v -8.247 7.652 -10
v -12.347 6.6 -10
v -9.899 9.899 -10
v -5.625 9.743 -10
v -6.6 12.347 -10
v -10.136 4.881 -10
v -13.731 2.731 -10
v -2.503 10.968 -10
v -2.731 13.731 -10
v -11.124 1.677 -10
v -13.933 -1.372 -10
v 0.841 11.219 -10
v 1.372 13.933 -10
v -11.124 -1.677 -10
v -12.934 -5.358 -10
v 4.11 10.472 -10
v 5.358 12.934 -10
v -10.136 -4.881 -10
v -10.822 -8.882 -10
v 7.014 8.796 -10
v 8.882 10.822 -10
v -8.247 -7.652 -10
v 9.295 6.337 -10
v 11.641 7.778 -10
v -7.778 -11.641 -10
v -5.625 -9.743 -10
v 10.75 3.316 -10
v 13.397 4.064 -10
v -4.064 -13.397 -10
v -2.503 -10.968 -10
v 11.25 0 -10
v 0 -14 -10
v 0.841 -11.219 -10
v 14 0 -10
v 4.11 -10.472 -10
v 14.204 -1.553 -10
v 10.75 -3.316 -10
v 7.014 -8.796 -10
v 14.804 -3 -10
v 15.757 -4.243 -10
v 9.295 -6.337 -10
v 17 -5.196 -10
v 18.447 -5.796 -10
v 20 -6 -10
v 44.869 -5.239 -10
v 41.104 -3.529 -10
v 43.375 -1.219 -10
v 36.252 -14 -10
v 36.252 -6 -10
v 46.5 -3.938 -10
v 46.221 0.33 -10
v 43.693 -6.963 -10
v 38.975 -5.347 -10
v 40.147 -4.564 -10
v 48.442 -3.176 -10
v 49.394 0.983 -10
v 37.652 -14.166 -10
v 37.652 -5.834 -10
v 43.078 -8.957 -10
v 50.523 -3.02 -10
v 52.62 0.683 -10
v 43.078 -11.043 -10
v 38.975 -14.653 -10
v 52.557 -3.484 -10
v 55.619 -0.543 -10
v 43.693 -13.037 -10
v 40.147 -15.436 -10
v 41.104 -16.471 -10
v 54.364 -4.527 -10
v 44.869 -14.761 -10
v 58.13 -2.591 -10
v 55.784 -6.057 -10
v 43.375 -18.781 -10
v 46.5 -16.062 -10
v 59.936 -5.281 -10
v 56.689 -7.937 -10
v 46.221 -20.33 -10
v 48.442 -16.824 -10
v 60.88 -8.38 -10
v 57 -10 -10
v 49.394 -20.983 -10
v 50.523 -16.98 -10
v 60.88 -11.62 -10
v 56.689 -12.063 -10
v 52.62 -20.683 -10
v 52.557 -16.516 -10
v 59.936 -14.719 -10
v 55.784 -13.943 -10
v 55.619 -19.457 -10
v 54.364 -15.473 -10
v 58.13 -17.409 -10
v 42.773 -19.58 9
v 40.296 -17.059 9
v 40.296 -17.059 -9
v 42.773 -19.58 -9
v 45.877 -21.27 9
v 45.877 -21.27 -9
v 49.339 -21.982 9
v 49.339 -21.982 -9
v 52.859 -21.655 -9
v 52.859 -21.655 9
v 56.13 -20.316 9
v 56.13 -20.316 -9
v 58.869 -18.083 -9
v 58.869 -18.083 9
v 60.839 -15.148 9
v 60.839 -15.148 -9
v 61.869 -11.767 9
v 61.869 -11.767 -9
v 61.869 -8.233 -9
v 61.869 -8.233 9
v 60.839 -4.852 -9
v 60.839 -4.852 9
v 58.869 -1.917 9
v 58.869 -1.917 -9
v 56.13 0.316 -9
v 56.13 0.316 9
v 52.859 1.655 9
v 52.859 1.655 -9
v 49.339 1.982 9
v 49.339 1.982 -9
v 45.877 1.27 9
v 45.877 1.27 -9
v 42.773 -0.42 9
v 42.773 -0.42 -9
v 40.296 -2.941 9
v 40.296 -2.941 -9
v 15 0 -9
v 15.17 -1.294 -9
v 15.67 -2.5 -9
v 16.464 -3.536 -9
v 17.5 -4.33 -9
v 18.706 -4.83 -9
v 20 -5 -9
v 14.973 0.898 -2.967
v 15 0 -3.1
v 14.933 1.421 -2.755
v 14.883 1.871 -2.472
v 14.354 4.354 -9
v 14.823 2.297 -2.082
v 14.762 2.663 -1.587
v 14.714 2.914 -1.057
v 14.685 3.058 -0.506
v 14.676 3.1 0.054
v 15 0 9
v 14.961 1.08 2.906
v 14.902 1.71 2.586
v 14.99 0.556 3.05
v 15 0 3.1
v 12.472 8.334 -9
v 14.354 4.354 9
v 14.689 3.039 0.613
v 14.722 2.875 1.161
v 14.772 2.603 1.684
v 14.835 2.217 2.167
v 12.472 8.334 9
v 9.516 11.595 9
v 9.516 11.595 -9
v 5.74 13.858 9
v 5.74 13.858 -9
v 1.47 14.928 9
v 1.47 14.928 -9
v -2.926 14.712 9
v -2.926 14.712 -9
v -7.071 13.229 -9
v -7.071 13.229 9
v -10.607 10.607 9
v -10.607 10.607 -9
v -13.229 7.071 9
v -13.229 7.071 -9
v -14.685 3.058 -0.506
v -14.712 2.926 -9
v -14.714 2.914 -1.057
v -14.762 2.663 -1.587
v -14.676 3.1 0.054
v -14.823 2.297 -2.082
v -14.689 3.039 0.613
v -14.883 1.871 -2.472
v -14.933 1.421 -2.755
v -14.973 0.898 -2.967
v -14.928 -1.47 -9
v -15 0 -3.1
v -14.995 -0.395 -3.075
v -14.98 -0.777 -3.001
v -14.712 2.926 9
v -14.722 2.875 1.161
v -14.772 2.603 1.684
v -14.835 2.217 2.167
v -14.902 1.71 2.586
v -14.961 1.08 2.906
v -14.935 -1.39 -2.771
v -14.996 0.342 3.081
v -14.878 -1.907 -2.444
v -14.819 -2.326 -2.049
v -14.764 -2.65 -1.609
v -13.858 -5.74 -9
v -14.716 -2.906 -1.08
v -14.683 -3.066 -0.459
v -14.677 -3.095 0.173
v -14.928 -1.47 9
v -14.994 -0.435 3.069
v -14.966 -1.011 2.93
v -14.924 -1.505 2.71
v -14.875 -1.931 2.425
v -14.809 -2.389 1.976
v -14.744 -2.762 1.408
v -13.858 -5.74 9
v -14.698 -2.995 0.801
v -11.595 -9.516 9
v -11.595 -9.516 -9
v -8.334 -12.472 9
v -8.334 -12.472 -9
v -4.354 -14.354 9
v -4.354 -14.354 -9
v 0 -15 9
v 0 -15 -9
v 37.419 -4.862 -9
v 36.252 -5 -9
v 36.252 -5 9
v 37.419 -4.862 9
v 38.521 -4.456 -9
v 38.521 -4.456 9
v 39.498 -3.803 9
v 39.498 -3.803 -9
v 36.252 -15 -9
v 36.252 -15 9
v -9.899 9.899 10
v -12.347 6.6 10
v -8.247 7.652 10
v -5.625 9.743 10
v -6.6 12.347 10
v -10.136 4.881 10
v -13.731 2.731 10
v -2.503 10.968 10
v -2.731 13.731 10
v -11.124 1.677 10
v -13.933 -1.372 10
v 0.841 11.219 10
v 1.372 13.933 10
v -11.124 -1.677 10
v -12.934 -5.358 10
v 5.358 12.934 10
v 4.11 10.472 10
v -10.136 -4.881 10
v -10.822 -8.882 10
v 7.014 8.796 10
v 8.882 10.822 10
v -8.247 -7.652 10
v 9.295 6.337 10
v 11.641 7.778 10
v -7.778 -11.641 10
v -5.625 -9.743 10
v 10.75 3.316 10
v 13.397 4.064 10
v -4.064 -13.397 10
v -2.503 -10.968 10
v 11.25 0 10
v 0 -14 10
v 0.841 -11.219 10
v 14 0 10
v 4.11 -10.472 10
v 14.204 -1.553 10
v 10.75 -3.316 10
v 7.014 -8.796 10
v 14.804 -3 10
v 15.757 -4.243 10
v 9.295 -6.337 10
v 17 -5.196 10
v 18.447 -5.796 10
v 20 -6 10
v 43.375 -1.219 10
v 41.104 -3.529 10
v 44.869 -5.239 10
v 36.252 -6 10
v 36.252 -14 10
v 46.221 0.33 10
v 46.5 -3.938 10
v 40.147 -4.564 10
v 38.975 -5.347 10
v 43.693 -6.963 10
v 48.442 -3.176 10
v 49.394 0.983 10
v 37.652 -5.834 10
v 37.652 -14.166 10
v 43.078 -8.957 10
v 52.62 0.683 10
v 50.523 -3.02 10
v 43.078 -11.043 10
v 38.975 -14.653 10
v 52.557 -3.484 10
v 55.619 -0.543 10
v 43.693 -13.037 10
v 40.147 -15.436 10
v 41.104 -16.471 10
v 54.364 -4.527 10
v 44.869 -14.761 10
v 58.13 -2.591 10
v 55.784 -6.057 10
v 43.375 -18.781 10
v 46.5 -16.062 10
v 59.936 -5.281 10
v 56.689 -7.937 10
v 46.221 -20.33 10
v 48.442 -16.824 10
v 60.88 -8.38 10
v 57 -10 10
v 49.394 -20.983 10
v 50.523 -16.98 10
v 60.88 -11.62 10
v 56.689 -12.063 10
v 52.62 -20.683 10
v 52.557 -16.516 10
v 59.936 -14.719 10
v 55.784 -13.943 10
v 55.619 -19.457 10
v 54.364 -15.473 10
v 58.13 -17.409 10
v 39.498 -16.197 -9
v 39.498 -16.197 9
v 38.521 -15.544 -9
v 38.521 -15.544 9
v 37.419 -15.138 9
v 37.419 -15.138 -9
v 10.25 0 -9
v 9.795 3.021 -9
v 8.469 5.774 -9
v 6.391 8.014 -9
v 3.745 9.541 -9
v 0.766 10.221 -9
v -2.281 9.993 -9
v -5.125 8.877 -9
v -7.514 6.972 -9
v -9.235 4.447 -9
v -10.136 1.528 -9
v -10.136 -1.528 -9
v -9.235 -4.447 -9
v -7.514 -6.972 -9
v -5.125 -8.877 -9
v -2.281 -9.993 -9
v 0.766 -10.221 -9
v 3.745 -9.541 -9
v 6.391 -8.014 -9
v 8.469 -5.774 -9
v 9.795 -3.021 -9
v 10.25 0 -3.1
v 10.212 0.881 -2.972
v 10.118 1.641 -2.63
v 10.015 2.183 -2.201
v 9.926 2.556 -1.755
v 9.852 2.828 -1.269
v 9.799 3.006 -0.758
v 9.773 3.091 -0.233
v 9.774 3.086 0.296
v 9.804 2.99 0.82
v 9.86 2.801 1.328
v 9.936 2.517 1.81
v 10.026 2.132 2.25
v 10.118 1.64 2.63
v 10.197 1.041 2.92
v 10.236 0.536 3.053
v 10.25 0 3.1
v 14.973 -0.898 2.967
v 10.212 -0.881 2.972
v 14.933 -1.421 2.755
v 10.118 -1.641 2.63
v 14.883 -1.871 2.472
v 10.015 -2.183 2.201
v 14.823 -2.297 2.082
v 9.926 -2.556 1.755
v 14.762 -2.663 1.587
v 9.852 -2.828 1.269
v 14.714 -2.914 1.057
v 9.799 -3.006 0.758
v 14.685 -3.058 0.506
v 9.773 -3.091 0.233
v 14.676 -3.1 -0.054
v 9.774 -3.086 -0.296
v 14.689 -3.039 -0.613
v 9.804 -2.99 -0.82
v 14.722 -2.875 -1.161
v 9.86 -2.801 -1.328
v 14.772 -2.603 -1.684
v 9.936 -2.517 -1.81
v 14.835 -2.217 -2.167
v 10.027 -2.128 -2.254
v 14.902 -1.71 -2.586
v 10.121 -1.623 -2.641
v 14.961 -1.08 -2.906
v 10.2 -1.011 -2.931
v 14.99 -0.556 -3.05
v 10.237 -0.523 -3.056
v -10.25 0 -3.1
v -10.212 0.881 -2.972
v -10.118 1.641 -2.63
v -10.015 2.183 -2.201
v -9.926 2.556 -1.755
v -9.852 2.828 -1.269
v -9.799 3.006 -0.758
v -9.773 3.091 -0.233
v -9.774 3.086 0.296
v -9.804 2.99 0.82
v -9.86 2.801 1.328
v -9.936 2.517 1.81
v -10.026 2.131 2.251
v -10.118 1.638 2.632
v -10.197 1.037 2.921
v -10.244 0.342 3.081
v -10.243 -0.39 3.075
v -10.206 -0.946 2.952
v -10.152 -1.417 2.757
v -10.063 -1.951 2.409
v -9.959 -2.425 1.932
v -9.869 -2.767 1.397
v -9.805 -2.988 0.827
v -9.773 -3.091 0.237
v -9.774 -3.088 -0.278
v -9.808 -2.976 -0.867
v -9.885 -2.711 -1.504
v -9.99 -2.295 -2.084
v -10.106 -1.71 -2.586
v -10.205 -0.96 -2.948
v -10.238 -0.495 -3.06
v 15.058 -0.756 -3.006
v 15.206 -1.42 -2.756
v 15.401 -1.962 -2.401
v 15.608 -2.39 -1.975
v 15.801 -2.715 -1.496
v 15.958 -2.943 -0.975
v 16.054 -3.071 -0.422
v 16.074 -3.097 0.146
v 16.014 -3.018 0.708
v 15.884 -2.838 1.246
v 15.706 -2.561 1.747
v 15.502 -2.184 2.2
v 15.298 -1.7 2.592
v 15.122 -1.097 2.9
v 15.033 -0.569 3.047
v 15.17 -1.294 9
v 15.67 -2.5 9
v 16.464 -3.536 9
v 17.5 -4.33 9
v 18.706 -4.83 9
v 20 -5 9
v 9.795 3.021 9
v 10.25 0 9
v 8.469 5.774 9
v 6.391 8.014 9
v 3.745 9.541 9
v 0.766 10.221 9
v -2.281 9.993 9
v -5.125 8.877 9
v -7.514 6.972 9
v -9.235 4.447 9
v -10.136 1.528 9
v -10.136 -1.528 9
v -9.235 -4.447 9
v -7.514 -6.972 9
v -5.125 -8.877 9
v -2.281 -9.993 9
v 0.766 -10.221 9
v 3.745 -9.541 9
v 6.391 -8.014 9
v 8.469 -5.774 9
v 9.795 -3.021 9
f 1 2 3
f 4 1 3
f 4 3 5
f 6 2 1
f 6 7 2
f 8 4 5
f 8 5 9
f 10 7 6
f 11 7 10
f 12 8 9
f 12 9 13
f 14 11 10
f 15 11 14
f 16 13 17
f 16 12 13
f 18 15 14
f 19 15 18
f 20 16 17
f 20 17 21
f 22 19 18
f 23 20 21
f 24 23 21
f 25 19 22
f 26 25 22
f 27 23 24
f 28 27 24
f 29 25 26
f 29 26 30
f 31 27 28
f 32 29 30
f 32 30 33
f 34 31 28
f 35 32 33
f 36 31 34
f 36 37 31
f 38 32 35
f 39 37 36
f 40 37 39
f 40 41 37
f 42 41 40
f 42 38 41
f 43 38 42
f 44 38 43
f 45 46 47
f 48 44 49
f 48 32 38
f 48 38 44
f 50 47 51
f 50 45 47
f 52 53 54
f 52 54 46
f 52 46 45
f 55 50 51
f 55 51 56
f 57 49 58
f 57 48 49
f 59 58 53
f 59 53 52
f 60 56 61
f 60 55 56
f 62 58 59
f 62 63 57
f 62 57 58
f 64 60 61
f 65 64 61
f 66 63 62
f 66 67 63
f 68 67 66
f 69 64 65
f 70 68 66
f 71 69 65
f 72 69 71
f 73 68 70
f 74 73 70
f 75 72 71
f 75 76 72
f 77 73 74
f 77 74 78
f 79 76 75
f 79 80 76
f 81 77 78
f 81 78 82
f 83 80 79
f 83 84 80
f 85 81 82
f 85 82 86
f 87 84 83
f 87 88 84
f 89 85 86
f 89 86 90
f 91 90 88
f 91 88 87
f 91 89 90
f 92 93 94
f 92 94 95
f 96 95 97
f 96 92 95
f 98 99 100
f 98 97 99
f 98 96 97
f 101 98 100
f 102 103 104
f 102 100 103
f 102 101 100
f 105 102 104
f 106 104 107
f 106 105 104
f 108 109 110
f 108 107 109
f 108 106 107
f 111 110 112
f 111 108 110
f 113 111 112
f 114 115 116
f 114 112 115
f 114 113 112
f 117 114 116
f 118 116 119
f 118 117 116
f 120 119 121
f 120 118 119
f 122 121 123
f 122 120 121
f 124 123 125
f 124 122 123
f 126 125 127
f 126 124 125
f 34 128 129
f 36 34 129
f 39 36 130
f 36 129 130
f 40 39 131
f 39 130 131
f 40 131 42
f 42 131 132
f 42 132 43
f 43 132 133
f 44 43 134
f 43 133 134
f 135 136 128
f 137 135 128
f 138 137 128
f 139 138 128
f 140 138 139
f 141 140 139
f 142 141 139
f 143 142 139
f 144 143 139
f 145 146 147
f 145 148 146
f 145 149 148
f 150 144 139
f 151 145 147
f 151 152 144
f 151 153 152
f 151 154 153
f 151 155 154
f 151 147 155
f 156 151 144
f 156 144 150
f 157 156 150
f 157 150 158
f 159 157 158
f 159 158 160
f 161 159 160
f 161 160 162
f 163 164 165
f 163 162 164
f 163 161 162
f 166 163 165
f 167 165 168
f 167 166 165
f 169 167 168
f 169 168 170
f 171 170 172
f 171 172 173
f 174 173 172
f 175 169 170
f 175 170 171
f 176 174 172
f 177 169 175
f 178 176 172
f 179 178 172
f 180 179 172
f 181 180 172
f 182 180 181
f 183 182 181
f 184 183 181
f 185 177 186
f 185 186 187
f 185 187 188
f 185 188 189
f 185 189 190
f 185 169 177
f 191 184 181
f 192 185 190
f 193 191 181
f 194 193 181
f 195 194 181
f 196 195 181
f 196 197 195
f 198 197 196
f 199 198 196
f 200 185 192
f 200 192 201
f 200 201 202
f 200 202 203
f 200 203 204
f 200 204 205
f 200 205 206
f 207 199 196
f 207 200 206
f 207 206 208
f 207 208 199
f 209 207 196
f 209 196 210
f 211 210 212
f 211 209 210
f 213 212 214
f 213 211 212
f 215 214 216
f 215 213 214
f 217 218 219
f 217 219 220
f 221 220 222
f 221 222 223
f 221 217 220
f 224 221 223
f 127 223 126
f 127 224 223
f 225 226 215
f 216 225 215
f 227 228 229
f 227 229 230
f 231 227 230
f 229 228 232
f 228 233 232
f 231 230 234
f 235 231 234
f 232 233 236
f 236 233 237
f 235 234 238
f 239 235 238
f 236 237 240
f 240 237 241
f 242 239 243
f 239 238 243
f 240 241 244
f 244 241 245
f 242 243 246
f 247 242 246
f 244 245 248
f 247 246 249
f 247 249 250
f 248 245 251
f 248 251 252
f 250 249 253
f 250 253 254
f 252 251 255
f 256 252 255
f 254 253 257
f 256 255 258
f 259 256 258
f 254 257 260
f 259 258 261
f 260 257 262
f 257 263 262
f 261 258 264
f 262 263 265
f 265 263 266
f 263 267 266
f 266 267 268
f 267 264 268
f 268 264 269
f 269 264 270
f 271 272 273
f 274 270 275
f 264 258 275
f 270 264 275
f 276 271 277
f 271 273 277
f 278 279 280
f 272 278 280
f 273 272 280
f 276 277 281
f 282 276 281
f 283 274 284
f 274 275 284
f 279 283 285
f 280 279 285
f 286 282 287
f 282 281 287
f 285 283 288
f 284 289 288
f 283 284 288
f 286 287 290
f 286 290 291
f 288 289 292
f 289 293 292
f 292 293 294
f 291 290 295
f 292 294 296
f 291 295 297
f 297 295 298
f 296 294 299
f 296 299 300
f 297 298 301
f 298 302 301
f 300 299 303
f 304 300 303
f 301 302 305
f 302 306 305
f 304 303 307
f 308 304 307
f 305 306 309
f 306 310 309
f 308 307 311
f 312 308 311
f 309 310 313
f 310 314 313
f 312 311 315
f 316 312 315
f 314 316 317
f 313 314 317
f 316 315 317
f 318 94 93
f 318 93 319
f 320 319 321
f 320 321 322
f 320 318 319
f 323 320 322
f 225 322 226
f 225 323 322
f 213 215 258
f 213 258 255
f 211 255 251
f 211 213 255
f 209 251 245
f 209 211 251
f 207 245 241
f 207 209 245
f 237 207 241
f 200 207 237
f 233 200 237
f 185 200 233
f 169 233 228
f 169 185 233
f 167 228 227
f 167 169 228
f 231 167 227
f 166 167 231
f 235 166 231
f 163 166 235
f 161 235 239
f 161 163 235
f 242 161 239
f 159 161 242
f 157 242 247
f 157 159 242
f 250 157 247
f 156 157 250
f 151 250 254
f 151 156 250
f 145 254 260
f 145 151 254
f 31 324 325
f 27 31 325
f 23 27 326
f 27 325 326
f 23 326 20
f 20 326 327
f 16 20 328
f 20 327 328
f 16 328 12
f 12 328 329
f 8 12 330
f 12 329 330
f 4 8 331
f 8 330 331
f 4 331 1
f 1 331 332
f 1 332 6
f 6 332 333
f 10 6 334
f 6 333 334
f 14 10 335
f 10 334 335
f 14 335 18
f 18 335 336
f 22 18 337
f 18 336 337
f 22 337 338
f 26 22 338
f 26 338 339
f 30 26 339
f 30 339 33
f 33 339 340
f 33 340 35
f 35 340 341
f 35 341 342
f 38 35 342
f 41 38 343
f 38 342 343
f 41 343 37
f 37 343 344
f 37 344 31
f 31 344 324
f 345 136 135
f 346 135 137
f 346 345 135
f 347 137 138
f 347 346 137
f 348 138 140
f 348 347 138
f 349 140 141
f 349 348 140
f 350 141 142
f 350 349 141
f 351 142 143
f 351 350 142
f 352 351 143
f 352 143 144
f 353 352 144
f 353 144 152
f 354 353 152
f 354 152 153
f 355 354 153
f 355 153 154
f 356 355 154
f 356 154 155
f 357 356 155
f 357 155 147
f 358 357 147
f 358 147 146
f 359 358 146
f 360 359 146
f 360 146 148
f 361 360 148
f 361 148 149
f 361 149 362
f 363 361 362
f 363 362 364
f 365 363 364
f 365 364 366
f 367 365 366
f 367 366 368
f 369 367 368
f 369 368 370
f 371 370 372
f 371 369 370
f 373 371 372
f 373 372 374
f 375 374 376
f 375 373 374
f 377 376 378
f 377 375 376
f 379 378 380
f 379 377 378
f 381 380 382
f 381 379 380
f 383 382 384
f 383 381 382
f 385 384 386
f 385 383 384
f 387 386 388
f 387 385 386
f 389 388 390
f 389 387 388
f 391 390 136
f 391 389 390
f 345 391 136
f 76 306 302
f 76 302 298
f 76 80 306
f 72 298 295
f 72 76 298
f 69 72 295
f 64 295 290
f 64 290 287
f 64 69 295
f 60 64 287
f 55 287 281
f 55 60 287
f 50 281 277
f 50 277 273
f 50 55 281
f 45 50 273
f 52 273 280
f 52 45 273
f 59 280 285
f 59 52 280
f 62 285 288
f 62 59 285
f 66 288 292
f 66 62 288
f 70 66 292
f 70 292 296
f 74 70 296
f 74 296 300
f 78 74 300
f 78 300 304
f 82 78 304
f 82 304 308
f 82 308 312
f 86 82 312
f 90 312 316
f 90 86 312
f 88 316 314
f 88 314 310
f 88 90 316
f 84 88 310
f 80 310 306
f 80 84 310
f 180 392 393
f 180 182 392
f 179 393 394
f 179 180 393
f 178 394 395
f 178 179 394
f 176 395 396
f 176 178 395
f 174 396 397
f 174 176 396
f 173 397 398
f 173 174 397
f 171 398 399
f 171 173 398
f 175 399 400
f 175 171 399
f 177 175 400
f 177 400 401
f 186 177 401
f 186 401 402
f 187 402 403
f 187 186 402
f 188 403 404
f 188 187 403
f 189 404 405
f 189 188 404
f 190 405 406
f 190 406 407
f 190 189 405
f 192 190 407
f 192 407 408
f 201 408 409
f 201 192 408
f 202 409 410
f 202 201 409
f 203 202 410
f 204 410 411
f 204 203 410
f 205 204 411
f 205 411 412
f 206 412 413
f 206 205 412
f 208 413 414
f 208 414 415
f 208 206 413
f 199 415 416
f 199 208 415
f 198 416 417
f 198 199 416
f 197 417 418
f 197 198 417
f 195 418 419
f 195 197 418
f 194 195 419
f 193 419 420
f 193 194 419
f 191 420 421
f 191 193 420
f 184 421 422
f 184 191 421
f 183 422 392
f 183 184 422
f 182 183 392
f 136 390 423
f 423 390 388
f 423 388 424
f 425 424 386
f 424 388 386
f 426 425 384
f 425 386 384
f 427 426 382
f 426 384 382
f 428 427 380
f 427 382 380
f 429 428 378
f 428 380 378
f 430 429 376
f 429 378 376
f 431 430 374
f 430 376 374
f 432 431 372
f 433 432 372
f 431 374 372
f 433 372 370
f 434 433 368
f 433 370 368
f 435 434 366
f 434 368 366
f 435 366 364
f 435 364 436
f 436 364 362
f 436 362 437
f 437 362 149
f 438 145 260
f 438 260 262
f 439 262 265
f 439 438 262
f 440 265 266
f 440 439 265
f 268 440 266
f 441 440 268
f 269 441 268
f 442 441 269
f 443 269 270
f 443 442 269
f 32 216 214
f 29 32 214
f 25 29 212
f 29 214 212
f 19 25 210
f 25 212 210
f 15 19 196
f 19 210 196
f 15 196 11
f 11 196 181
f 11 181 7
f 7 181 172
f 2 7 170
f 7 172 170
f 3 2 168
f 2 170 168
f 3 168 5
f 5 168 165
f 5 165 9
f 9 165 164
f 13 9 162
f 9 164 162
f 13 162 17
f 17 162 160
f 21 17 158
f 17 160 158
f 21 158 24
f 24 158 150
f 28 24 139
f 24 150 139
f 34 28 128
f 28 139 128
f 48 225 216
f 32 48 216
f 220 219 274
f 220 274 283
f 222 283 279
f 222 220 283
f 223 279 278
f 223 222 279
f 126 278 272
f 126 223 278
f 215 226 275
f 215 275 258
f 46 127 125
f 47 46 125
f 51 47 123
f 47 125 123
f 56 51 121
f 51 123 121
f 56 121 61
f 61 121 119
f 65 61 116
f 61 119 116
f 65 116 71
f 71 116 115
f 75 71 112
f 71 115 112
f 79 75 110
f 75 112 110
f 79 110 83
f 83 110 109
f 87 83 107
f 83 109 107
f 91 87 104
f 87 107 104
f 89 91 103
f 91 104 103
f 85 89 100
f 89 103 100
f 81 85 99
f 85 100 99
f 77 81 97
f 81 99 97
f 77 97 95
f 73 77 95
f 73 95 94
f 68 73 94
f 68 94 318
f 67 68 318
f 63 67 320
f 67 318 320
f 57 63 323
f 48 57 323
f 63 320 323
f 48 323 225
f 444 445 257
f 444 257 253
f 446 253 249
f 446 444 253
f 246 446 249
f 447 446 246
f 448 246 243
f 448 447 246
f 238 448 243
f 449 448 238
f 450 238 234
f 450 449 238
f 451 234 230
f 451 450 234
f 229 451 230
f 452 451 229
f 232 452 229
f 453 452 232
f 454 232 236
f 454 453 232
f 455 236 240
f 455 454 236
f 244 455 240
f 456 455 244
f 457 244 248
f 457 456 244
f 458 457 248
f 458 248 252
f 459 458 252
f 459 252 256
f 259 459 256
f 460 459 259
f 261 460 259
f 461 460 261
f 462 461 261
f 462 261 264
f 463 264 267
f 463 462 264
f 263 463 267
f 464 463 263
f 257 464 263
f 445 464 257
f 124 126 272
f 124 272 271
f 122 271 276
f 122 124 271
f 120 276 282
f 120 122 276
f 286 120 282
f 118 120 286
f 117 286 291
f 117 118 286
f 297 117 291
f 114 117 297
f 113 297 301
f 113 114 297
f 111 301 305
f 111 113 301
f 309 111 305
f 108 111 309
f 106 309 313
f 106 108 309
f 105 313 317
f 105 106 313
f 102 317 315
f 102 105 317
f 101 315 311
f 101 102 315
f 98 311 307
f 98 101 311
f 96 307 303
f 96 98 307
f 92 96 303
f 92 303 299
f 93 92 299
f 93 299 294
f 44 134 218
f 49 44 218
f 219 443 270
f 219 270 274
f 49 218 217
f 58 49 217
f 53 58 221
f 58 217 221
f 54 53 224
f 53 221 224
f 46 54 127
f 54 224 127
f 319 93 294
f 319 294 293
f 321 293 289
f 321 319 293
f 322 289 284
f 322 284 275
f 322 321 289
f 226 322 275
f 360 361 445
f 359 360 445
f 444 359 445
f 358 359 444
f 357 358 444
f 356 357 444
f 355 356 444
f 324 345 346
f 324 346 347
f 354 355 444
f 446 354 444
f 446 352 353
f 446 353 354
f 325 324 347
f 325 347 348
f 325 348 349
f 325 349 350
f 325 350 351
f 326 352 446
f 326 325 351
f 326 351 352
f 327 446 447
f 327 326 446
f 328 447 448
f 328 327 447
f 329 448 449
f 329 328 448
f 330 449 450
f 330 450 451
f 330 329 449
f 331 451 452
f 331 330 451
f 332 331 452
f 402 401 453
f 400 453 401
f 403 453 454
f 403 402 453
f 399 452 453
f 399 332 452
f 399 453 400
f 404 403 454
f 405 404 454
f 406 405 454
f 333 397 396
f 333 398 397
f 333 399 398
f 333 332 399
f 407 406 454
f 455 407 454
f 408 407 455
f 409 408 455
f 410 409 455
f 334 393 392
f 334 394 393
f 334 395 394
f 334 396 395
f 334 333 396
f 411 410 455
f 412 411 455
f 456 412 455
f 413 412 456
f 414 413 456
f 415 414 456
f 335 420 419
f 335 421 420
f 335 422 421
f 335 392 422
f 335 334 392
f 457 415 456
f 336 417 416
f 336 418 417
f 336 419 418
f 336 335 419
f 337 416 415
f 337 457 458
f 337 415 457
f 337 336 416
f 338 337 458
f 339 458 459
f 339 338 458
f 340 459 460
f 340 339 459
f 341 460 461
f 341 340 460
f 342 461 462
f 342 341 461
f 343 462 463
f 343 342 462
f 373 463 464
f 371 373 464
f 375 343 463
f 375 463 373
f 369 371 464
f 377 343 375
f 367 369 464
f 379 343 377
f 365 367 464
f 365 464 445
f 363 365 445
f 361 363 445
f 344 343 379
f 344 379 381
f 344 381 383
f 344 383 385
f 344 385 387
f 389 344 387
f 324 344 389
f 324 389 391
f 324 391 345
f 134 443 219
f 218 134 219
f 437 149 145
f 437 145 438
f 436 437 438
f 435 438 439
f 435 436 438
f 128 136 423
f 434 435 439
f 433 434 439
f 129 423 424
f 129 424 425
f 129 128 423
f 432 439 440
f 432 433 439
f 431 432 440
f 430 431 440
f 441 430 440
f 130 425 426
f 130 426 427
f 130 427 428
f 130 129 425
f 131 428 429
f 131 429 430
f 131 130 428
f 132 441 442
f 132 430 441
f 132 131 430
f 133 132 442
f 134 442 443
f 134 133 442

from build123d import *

# Parameters (mm, degrees)
SKETCH_1_R               = 15
SKETCH_1_R_2             = 10.25
EXTRUDE_1_DEPTH          = 10
CUT_EXTRUDE_1_DEPTH      = 24.452078799
CUT_EXTRUDE_1_DEPTH_BACK = 24.452078799
SKETCH_2_R               = 3.1
SKETCH_3_R               = 12
SKETCH_3_R_2             = 7
EXTRUDE_2_DEPTH          = 10
EXTRUDE_3_DEPTH          = 10
FILLET_1_R               = 5
CHAMFER_1_SIZE           = 1


with BuildPart() as part:
    # 草图1 → 凸台-拉伸1 (new, symmetric)
    with BuildSketch(Plane.XY):
        Circle(SKETCH_1_R)
        Circle(SKETCH_1_R_2, mode=Mode.SUBTRACT)
    extrude(amount=EXTRUDE_1_DEPTH, both=True)

    # 草图2 → 切除-拉伸1 (cut, two sides: drawn at the far end of the back side and taken through both)
    with BuildSketch(Plane(origin=(0, 0, 0), x_dir=(0, 0, -1), z_dir=(1, 0, 0)).offset(-CUT_EXTRUDE_1_DEPTH_BACK)):
        Circle(SKETCH_2_R)
    extrude(amount=CUT_EXTRUDE_1_DEPTH + CUT_EXTRUDE_1_DEPTH_BACK, mode=Mode.SUBTRACT)



with BuildPart() as body_2:
    # 草图3 → 凸台-拉伸2 (new, symmetric)
    with BuildSketch(Plane.XY):
        with Locations((50, -10)):
            Circle(SKETCH_3_R)
        with Locations((50, -10)):
            Circle(SKETCH_3_R_2, mode=Mode.SUBTRACT)
    extrude(amount=EXTRUDE_2_DEPTH, both=True)


with BuildPart() as part_1:
    add(part.part)

    add(body_2.part)  # 凸台-拉伸3 merges body 2
    # 草图4 → 凸台-拉伸3 (add, symmetric)
    with BuildSketch(Plane.XY):
        with BuildLine():
            Line((40.202041029, -15), (0, -15))
            ThreePointArc((0, -15), (8.660254038, -12.247448714), (14.142135624, -5))
            Line((14.142135624, -5), (40.202041029, -5))
            ThreePointArc((40.202041029, -5), (39, -10), (40.202041029, -15))
        make_face()
    extrude(amount=EXTRUDE_3_DEPTH, both=True)

    # 圆角1
    # the kernel refuses this fillet: 5 mm, written as the material it adds along each edge
    with BuildSketch(Plane(origin=(14.142135624, -5, -10), x_dir=(0.1691019787257651, 0.9855985596534883, 0), z_dir=(0, 0, 1))) as fillet_1_piece_1_section:
        with BuildLine():
            CenterArc((5.918569255, -4.927992798), FILLET_1_R, 99.735610317, 90)
            Line((0.990576457, -5.773502692), (0, 0))
            ThreePointArc((0, 0), (2.536529681, -0.216021605), (5.073059362, 0))
        make_face()
    fillet_1_piece_1 = extrude(amount=20, mode=Mode.PRIVATE)
    fillet_1_piece_1 = fillet_1_piece_1 - Plane(origin=(15.878746953, 0, 0), x_dir=(0, 0, -1), z_dir=(-1, 0, 0)) * Cylinder(3.1, 64, mode=Mode.PRIVATE)
    add(fillet_1_piece_1)
    with BuildSketch(Plane(origin=(39.091287885, -15, -10), x_dir=(0.5049509852949774, -0.8631480188528684, 0), z_dir=(0, 0, 1))) as fillet_1_piece_2:
        with BuildLine():
            CenterArc((2.882176688, -4.975245074), FILLET_1_R, 95.70378036, 53.968120928)
            Line((-1.433563406, -2.450490147), (0, 0))
            ThreePointArc((0, 0), (1.192624836, -0.059411824), (2.385249673, 0))
        make_face()
    extrude(amount=20)
    with BuildSketch(Plane(origin=(39.091287885, -5, -10), x_dir=(-1, 0, 0), z_dir=(0, 0, 1))) as fillet_1_piece_3:
        with BuildLine():
            CenterArc((2.83901497, -5), FILLET_1_R, 90, 53.968120928)
            ThreePointArc((-1.204434172, -2.058823529), (-0.550935888, -1.059411824), (0, 0))
            Line((0, 0), (2.83901497, 0))
        make_face()
    extrude(amount=20)

    # 倒角1
    chamfer_1_edges = [part_1.edges().sort_by_distance(p)[0] for p in [
        (18.126136458, -15, -10),
        (18.126136458, -15, 10),
        (62, -10, -10),
        (-10.25, 0, -10),
        (62, -10, 10),
        (28.126136458, -5, -10),
        (-10.25, 0, 10),
        (28.126136458, -5, 10),
        (-10.606601718, 10.606601718, -10),
        (-10.606601718, 10.606601718, 10),
        (38.520985948, -15.544336057, -10),
        (38.520985948, -15.544336057, 10),
        (38.520985948, -4.455663943, 10),
        (38.520985948, -4.455663943, -10),
        (16.464466094, -3.535533906, -10),
        (16.464466094, -3.535533906, 10),
    ]]
    chamfer(chamfer_1_edges, length=CHAMFER_1_SIZE)


solid = part_1.part
